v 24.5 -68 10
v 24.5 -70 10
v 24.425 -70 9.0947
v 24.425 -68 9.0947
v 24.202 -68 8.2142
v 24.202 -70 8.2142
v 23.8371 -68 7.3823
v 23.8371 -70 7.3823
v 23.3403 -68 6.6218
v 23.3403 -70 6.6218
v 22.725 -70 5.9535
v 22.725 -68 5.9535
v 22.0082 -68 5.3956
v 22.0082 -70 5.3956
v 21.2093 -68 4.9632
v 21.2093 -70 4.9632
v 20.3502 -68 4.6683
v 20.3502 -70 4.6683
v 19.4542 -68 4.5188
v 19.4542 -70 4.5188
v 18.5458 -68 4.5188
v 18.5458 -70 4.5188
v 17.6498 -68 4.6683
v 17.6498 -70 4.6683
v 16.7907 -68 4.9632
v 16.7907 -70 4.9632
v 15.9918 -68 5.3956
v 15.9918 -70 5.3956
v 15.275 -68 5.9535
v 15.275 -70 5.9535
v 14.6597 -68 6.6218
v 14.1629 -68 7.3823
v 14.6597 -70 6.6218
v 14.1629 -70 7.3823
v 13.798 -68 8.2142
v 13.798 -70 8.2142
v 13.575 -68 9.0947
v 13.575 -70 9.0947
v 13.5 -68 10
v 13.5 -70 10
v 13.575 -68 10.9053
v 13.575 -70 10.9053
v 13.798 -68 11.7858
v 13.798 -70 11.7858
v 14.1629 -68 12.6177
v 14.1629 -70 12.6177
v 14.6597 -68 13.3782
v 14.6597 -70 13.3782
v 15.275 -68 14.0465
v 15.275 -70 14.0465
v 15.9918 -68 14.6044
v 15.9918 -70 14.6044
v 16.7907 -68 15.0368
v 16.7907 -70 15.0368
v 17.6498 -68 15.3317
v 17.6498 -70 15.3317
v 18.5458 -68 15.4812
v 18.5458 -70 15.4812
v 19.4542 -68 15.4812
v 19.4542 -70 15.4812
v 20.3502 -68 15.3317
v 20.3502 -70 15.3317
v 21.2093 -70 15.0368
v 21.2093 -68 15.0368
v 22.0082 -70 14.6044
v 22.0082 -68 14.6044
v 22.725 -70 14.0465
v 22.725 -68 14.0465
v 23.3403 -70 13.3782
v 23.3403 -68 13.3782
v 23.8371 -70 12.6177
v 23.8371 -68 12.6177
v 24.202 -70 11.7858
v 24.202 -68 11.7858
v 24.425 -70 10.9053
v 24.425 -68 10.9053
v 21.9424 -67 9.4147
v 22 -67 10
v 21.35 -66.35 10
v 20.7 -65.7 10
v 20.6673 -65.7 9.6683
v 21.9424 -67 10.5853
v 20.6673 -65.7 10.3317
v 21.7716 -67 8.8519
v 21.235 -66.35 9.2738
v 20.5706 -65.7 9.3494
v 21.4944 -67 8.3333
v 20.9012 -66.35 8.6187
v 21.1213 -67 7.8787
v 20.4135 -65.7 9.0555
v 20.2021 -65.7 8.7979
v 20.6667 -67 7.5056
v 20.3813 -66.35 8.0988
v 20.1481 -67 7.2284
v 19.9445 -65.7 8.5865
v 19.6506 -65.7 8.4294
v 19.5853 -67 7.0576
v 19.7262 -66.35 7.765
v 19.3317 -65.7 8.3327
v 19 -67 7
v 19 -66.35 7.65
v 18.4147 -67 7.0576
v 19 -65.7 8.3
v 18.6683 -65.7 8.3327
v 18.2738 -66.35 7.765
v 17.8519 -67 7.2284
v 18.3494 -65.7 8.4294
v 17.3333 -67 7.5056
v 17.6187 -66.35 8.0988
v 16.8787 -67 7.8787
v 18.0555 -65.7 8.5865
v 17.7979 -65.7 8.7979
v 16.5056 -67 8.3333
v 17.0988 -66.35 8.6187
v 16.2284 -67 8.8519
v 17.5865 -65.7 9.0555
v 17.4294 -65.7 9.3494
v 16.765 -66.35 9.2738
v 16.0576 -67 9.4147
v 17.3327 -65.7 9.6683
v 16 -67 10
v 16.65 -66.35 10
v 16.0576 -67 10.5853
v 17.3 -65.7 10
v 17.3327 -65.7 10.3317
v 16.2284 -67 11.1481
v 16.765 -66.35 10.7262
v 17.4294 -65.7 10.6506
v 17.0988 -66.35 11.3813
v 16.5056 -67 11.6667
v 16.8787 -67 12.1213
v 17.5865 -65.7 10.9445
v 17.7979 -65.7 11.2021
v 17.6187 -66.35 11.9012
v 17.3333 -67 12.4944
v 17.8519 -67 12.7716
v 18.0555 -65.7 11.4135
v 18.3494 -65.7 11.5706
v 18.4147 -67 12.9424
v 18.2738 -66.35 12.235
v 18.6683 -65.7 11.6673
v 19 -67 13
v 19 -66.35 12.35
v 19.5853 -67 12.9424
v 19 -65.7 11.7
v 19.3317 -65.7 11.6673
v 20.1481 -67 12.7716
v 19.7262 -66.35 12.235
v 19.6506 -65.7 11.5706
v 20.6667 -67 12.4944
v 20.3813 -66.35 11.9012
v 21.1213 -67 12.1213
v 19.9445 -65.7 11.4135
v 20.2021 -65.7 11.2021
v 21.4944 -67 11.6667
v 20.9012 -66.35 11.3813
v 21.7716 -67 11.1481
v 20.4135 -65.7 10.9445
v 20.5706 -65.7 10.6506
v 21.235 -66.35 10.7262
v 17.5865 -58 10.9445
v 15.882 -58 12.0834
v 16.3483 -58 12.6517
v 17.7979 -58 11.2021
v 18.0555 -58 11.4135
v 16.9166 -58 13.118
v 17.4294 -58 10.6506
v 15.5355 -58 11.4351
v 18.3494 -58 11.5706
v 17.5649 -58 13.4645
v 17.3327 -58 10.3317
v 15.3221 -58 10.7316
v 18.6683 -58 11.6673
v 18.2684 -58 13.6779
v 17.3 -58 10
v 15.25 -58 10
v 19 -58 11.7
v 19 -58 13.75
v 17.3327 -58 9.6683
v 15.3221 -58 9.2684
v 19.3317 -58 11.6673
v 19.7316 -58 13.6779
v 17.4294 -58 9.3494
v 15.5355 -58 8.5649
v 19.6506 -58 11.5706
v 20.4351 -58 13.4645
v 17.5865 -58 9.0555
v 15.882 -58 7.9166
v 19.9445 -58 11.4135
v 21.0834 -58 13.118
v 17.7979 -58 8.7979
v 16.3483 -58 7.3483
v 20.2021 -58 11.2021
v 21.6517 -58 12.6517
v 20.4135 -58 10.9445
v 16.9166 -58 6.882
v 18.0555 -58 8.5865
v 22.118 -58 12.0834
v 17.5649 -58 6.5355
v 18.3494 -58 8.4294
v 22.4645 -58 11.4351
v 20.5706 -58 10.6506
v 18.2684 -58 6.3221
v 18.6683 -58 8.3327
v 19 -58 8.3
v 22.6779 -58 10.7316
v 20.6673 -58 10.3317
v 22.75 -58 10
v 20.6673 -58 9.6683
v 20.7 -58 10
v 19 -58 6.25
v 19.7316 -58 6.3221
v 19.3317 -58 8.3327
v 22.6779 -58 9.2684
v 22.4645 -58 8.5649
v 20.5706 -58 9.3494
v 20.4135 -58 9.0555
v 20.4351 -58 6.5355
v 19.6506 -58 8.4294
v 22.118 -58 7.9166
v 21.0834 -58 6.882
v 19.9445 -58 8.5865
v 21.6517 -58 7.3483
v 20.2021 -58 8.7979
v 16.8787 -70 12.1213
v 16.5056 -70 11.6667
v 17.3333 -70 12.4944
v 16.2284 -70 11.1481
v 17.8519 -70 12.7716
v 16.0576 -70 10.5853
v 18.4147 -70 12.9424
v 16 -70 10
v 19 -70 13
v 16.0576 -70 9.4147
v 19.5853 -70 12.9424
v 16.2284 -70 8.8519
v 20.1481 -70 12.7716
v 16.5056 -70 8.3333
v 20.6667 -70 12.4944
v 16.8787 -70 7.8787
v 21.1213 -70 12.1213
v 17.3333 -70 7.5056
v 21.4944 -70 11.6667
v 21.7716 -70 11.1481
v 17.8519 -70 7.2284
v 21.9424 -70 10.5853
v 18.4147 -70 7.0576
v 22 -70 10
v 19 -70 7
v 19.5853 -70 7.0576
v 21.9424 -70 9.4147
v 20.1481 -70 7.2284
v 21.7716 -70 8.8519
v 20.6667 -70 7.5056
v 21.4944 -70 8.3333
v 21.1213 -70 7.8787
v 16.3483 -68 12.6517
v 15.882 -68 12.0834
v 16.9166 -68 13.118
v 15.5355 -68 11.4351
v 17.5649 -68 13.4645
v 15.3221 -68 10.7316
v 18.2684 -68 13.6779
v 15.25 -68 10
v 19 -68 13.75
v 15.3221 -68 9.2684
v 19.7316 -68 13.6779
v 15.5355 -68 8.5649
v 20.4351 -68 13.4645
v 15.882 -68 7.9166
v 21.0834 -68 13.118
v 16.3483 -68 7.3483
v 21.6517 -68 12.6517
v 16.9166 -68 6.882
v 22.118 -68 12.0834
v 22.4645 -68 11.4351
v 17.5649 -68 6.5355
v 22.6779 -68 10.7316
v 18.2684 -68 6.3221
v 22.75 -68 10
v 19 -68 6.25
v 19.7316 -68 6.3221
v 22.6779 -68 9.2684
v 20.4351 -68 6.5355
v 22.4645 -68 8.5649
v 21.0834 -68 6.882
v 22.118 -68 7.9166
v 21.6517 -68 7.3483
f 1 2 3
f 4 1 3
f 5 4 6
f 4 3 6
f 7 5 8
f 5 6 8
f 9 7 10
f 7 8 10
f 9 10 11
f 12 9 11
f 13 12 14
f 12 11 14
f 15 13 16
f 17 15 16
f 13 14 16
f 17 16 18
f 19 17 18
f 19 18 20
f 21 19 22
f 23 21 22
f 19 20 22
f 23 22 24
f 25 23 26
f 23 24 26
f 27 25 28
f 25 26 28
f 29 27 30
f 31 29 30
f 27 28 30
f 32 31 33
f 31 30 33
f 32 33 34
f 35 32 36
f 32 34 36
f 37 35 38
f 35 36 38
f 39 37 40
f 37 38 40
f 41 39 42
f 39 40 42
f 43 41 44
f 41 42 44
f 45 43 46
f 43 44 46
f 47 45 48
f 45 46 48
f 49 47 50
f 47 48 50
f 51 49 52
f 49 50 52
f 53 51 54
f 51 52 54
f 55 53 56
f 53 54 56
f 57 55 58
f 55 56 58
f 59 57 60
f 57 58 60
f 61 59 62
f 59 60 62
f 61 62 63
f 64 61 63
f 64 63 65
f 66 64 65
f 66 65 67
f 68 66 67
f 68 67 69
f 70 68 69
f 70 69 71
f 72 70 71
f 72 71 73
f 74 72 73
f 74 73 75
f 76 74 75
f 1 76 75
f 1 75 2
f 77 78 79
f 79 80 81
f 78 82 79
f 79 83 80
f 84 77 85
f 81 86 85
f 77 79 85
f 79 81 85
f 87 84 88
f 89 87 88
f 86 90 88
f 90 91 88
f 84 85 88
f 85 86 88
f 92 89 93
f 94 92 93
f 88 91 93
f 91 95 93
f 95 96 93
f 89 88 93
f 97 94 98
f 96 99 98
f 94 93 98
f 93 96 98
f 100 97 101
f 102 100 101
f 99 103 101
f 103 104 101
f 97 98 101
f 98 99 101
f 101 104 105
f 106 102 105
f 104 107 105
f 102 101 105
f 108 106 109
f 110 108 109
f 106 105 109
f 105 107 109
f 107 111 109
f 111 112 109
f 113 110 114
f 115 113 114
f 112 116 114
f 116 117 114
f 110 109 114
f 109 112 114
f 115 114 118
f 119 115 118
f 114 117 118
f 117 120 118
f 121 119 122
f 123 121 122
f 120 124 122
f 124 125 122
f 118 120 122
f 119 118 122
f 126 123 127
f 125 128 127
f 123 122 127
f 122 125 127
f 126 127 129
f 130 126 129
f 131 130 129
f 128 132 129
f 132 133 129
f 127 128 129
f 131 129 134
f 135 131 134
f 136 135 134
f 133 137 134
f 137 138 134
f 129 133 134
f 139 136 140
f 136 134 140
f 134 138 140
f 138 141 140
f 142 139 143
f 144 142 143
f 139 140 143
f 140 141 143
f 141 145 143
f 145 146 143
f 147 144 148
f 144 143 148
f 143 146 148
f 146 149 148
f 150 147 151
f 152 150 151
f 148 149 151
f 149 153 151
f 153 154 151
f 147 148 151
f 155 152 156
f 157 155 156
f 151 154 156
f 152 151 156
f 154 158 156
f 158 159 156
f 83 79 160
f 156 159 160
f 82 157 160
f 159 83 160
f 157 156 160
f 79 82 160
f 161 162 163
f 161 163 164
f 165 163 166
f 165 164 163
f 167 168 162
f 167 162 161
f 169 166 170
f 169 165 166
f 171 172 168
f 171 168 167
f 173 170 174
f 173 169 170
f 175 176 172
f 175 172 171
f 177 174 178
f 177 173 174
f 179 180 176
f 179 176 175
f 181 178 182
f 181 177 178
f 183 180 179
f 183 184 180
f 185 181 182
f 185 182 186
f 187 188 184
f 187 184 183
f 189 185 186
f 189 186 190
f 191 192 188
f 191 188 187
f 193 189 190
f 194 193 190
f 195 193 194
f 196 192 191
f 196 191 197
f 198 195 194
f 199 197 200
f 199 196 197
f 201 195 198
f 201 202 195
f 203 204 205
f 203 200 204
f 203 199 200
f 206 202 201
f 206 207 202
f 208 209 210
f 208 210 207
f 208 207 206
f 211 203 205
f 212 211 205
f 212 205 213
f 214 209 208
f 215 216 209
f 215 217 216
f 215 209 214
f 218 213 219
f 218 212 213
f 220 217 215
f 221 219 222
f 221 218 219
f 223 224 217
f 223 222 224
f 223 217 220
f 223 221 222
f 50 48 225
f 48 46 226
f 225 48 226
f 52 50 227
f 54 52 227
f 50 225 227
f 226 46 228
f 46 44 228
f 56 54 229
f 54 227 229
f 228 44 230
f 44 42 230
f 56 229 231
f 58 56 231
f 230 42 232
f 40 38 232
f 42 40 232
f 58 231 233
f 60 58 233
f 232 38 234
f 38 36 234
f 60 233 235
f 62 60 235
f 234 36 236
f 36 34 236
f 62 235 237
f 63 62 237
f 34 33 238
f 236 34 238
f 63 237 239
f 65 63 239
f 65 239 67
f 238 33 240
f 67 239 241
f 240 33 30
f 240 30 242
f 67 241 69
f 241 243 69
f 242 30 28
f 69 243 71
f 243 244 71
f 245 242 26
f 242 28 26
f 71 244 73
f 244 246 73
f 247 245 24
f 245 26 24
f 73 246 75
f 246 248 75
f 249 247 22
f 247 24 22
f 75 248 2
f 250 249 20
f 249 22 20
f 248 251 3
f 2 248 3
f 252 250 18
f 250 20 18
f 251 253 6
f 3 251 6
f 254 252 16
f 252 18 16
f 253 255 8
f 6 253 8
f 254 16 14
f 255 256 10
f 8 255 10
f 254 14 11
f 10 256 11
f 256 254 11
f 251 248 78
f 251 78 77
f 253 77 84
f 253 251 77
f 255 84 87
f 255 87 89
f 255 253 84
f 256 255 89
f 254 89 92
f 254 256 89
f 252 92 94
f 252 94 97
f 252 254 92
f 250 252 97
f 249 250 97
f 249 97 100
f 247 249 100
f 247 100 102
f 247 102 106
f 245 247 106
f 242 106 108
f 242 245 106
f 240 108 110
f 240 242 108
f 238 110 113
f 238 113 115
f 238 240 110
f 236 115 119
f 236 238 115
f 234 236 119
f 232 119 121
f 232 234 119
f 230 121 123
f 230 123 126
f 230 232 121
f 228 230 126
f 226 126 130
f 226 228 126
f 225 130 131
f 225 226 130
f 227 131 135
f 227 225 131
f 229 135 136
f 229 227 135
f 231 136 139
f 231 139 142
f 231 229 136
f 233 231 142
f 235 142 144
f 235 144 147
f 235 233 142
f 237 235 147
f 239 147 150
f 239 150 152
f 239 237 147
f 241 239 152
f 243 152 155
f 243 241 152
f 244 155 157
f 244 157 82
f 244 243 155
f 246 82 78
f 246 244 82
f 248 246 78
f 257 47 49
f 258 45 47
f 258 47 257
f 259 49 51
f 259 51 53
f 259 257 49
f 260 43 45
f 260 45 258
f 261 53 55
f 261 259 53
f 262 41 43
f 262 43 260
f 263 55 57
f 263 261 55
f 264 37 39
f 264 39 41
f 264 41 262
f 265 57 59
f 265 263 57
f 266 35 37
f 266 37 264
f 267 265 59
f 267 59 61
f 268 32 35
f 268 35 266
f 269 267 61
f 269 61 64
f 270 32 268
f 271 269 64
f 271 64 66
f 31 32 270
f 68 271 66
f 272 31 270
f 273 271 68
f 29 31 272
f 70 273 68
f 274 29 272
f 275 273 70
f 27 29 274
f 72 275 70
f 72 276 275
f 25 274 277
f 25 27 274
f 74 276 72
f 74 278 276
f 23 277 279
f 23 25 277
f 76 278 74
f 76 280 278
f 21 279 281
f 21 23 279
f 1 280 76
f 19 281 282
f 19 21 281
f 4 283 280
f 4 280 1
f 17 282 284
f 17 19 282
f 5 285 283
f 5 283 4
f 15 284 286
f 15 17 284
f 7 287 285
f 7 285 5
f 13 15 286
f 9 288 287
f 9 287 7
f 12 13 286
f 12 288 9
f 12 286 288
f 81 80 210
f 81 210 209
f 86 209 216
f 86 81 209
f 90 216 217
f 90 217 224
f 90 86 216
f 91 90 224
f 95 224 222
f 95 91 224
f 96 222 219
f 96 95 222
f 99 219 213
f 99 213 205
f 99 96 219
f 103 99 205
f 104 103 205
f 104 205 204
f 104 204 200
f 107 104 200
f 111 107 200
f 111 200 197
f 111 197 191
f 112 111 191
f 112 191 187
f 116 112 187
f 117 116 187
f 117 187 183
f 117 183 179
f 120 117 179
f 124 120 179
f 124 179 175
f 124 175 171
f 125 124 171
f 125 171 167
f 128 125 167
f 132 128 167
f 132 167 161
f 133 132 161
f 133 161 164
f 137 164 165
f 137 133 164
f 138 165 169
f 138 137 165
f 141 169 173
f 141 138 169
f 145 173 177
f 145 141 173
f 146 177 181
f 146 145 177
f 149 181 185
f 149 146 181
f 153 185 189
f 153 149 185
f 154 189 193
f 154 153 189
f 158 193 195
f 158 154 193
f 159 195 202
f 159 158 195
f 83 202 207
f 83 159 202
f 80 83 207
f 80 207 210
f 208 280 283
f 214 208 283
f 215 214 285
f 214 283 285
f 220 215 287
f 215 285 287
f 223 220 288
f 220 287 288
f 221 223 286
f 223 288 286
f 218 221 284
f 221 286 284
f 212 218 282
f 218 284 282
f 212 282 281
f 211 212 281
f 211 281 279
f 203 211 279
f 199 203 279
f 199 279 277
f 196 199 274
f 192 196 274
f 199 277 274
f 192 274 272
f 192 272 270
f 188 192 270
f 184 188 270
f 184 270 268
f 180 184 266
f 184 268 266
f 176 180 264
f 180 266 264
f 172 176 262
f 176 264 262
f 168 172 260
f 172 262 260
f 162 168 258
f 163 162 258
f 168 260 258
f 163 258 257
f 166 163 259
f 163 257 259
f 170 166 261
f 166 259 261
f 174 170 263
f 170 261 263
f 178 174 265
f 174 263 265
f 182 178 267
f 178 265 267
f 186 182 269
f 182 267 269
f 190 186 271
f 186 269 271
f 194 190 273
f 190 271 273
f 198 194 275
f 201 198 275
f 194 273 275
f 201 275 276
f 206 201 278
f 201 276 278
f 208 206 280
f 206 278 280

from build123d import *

# Parameters (mm, degrees)
CYLINDER100_R     = 1.7
CYLINDER100_DEPTH = 12
CYLINDER099_R     = 3
CYLINDER099_DEPTH = 3
CYLINDER098_R     = 3.75
CYLINDER098_DEPTH = 10
CYLINDER097_R     = 5.5
CYLINDER097_DEPTH = 2
CUT051_ROLL_ANGLE = -90


with BuildPart() as deltacylinder036:
    # Cylinder100 → Cylinder100 (new body)
    with BuildSketch(Plane.XY):
        Circle(CYLINDER100_R)
    extrude(amount=CYLINDER100_DEPTH)


with BuildPart() as deltacylinder035:
    # Cylinder099 → Cylinder099 (new body)
    with BuildSketch(Plane.XY):
        Circle(CYLINDER099_R)
    extrude(amount=CYLINDER099_DEPTH)


with BuildPart() as deltacone001:
    # Cone007 → Cone007 (revolve)
    with BuildSketch(Plane(origin=(0, 0, 3), x_dir=(1, 0, 0), z_dir=(0, -1, 0))):
        Polygon((0, 0), (3, 0), (1.7, 1.3), (0, 1.3), align=None)
    revolve(axis=Axis((0, 0, 3), (0, 0, 1)))


with BuildPart() as cylinder117:
    # Cylinder098 → Cylinder098 (new body)
    with BuildSketch(Plane.XY.offset(2)):
        Circle(CYLINDER098_R)
    extrude(amount=CYLINDER098_DEPTH)


with BuildPart() as springguide:
    # Cylinder097 → Cylinder097 (new body)
    with BuildSketch(Plane.XY):
        Circle(CYLINDER097_R)
    extrude(amount=CYLINDER097_DEPTH)

    # Fusion004: union Cylinder117
    add(cylinder117.part)

    # Cut049: cut DeltaCone001
    add(deltacone001.part, mode=Mode.SUBTRACT)

    # Cut050: cut DeltaCylinder035
    add(deltacylinder035.part, mode=Mode.SUBTRACT)

    # Cut051: cut DeltaCylinder036
    add(deltacylinder036.part, mode=Mode.SUBTRACT)


with BuildPart() as springguide_1:
    # Cut051 roll: moved
    add(springguide.part.rotate(Axis((0, 0, 0), (1, 0, 0)), CUT051_ROLL_ANGLE))


with BuildPart() as springguide_2:
    # Cut051 placement: moved
    add(springguide_1.part.moved(Location((19, -70, 10))))


solid = springguide_2.part
